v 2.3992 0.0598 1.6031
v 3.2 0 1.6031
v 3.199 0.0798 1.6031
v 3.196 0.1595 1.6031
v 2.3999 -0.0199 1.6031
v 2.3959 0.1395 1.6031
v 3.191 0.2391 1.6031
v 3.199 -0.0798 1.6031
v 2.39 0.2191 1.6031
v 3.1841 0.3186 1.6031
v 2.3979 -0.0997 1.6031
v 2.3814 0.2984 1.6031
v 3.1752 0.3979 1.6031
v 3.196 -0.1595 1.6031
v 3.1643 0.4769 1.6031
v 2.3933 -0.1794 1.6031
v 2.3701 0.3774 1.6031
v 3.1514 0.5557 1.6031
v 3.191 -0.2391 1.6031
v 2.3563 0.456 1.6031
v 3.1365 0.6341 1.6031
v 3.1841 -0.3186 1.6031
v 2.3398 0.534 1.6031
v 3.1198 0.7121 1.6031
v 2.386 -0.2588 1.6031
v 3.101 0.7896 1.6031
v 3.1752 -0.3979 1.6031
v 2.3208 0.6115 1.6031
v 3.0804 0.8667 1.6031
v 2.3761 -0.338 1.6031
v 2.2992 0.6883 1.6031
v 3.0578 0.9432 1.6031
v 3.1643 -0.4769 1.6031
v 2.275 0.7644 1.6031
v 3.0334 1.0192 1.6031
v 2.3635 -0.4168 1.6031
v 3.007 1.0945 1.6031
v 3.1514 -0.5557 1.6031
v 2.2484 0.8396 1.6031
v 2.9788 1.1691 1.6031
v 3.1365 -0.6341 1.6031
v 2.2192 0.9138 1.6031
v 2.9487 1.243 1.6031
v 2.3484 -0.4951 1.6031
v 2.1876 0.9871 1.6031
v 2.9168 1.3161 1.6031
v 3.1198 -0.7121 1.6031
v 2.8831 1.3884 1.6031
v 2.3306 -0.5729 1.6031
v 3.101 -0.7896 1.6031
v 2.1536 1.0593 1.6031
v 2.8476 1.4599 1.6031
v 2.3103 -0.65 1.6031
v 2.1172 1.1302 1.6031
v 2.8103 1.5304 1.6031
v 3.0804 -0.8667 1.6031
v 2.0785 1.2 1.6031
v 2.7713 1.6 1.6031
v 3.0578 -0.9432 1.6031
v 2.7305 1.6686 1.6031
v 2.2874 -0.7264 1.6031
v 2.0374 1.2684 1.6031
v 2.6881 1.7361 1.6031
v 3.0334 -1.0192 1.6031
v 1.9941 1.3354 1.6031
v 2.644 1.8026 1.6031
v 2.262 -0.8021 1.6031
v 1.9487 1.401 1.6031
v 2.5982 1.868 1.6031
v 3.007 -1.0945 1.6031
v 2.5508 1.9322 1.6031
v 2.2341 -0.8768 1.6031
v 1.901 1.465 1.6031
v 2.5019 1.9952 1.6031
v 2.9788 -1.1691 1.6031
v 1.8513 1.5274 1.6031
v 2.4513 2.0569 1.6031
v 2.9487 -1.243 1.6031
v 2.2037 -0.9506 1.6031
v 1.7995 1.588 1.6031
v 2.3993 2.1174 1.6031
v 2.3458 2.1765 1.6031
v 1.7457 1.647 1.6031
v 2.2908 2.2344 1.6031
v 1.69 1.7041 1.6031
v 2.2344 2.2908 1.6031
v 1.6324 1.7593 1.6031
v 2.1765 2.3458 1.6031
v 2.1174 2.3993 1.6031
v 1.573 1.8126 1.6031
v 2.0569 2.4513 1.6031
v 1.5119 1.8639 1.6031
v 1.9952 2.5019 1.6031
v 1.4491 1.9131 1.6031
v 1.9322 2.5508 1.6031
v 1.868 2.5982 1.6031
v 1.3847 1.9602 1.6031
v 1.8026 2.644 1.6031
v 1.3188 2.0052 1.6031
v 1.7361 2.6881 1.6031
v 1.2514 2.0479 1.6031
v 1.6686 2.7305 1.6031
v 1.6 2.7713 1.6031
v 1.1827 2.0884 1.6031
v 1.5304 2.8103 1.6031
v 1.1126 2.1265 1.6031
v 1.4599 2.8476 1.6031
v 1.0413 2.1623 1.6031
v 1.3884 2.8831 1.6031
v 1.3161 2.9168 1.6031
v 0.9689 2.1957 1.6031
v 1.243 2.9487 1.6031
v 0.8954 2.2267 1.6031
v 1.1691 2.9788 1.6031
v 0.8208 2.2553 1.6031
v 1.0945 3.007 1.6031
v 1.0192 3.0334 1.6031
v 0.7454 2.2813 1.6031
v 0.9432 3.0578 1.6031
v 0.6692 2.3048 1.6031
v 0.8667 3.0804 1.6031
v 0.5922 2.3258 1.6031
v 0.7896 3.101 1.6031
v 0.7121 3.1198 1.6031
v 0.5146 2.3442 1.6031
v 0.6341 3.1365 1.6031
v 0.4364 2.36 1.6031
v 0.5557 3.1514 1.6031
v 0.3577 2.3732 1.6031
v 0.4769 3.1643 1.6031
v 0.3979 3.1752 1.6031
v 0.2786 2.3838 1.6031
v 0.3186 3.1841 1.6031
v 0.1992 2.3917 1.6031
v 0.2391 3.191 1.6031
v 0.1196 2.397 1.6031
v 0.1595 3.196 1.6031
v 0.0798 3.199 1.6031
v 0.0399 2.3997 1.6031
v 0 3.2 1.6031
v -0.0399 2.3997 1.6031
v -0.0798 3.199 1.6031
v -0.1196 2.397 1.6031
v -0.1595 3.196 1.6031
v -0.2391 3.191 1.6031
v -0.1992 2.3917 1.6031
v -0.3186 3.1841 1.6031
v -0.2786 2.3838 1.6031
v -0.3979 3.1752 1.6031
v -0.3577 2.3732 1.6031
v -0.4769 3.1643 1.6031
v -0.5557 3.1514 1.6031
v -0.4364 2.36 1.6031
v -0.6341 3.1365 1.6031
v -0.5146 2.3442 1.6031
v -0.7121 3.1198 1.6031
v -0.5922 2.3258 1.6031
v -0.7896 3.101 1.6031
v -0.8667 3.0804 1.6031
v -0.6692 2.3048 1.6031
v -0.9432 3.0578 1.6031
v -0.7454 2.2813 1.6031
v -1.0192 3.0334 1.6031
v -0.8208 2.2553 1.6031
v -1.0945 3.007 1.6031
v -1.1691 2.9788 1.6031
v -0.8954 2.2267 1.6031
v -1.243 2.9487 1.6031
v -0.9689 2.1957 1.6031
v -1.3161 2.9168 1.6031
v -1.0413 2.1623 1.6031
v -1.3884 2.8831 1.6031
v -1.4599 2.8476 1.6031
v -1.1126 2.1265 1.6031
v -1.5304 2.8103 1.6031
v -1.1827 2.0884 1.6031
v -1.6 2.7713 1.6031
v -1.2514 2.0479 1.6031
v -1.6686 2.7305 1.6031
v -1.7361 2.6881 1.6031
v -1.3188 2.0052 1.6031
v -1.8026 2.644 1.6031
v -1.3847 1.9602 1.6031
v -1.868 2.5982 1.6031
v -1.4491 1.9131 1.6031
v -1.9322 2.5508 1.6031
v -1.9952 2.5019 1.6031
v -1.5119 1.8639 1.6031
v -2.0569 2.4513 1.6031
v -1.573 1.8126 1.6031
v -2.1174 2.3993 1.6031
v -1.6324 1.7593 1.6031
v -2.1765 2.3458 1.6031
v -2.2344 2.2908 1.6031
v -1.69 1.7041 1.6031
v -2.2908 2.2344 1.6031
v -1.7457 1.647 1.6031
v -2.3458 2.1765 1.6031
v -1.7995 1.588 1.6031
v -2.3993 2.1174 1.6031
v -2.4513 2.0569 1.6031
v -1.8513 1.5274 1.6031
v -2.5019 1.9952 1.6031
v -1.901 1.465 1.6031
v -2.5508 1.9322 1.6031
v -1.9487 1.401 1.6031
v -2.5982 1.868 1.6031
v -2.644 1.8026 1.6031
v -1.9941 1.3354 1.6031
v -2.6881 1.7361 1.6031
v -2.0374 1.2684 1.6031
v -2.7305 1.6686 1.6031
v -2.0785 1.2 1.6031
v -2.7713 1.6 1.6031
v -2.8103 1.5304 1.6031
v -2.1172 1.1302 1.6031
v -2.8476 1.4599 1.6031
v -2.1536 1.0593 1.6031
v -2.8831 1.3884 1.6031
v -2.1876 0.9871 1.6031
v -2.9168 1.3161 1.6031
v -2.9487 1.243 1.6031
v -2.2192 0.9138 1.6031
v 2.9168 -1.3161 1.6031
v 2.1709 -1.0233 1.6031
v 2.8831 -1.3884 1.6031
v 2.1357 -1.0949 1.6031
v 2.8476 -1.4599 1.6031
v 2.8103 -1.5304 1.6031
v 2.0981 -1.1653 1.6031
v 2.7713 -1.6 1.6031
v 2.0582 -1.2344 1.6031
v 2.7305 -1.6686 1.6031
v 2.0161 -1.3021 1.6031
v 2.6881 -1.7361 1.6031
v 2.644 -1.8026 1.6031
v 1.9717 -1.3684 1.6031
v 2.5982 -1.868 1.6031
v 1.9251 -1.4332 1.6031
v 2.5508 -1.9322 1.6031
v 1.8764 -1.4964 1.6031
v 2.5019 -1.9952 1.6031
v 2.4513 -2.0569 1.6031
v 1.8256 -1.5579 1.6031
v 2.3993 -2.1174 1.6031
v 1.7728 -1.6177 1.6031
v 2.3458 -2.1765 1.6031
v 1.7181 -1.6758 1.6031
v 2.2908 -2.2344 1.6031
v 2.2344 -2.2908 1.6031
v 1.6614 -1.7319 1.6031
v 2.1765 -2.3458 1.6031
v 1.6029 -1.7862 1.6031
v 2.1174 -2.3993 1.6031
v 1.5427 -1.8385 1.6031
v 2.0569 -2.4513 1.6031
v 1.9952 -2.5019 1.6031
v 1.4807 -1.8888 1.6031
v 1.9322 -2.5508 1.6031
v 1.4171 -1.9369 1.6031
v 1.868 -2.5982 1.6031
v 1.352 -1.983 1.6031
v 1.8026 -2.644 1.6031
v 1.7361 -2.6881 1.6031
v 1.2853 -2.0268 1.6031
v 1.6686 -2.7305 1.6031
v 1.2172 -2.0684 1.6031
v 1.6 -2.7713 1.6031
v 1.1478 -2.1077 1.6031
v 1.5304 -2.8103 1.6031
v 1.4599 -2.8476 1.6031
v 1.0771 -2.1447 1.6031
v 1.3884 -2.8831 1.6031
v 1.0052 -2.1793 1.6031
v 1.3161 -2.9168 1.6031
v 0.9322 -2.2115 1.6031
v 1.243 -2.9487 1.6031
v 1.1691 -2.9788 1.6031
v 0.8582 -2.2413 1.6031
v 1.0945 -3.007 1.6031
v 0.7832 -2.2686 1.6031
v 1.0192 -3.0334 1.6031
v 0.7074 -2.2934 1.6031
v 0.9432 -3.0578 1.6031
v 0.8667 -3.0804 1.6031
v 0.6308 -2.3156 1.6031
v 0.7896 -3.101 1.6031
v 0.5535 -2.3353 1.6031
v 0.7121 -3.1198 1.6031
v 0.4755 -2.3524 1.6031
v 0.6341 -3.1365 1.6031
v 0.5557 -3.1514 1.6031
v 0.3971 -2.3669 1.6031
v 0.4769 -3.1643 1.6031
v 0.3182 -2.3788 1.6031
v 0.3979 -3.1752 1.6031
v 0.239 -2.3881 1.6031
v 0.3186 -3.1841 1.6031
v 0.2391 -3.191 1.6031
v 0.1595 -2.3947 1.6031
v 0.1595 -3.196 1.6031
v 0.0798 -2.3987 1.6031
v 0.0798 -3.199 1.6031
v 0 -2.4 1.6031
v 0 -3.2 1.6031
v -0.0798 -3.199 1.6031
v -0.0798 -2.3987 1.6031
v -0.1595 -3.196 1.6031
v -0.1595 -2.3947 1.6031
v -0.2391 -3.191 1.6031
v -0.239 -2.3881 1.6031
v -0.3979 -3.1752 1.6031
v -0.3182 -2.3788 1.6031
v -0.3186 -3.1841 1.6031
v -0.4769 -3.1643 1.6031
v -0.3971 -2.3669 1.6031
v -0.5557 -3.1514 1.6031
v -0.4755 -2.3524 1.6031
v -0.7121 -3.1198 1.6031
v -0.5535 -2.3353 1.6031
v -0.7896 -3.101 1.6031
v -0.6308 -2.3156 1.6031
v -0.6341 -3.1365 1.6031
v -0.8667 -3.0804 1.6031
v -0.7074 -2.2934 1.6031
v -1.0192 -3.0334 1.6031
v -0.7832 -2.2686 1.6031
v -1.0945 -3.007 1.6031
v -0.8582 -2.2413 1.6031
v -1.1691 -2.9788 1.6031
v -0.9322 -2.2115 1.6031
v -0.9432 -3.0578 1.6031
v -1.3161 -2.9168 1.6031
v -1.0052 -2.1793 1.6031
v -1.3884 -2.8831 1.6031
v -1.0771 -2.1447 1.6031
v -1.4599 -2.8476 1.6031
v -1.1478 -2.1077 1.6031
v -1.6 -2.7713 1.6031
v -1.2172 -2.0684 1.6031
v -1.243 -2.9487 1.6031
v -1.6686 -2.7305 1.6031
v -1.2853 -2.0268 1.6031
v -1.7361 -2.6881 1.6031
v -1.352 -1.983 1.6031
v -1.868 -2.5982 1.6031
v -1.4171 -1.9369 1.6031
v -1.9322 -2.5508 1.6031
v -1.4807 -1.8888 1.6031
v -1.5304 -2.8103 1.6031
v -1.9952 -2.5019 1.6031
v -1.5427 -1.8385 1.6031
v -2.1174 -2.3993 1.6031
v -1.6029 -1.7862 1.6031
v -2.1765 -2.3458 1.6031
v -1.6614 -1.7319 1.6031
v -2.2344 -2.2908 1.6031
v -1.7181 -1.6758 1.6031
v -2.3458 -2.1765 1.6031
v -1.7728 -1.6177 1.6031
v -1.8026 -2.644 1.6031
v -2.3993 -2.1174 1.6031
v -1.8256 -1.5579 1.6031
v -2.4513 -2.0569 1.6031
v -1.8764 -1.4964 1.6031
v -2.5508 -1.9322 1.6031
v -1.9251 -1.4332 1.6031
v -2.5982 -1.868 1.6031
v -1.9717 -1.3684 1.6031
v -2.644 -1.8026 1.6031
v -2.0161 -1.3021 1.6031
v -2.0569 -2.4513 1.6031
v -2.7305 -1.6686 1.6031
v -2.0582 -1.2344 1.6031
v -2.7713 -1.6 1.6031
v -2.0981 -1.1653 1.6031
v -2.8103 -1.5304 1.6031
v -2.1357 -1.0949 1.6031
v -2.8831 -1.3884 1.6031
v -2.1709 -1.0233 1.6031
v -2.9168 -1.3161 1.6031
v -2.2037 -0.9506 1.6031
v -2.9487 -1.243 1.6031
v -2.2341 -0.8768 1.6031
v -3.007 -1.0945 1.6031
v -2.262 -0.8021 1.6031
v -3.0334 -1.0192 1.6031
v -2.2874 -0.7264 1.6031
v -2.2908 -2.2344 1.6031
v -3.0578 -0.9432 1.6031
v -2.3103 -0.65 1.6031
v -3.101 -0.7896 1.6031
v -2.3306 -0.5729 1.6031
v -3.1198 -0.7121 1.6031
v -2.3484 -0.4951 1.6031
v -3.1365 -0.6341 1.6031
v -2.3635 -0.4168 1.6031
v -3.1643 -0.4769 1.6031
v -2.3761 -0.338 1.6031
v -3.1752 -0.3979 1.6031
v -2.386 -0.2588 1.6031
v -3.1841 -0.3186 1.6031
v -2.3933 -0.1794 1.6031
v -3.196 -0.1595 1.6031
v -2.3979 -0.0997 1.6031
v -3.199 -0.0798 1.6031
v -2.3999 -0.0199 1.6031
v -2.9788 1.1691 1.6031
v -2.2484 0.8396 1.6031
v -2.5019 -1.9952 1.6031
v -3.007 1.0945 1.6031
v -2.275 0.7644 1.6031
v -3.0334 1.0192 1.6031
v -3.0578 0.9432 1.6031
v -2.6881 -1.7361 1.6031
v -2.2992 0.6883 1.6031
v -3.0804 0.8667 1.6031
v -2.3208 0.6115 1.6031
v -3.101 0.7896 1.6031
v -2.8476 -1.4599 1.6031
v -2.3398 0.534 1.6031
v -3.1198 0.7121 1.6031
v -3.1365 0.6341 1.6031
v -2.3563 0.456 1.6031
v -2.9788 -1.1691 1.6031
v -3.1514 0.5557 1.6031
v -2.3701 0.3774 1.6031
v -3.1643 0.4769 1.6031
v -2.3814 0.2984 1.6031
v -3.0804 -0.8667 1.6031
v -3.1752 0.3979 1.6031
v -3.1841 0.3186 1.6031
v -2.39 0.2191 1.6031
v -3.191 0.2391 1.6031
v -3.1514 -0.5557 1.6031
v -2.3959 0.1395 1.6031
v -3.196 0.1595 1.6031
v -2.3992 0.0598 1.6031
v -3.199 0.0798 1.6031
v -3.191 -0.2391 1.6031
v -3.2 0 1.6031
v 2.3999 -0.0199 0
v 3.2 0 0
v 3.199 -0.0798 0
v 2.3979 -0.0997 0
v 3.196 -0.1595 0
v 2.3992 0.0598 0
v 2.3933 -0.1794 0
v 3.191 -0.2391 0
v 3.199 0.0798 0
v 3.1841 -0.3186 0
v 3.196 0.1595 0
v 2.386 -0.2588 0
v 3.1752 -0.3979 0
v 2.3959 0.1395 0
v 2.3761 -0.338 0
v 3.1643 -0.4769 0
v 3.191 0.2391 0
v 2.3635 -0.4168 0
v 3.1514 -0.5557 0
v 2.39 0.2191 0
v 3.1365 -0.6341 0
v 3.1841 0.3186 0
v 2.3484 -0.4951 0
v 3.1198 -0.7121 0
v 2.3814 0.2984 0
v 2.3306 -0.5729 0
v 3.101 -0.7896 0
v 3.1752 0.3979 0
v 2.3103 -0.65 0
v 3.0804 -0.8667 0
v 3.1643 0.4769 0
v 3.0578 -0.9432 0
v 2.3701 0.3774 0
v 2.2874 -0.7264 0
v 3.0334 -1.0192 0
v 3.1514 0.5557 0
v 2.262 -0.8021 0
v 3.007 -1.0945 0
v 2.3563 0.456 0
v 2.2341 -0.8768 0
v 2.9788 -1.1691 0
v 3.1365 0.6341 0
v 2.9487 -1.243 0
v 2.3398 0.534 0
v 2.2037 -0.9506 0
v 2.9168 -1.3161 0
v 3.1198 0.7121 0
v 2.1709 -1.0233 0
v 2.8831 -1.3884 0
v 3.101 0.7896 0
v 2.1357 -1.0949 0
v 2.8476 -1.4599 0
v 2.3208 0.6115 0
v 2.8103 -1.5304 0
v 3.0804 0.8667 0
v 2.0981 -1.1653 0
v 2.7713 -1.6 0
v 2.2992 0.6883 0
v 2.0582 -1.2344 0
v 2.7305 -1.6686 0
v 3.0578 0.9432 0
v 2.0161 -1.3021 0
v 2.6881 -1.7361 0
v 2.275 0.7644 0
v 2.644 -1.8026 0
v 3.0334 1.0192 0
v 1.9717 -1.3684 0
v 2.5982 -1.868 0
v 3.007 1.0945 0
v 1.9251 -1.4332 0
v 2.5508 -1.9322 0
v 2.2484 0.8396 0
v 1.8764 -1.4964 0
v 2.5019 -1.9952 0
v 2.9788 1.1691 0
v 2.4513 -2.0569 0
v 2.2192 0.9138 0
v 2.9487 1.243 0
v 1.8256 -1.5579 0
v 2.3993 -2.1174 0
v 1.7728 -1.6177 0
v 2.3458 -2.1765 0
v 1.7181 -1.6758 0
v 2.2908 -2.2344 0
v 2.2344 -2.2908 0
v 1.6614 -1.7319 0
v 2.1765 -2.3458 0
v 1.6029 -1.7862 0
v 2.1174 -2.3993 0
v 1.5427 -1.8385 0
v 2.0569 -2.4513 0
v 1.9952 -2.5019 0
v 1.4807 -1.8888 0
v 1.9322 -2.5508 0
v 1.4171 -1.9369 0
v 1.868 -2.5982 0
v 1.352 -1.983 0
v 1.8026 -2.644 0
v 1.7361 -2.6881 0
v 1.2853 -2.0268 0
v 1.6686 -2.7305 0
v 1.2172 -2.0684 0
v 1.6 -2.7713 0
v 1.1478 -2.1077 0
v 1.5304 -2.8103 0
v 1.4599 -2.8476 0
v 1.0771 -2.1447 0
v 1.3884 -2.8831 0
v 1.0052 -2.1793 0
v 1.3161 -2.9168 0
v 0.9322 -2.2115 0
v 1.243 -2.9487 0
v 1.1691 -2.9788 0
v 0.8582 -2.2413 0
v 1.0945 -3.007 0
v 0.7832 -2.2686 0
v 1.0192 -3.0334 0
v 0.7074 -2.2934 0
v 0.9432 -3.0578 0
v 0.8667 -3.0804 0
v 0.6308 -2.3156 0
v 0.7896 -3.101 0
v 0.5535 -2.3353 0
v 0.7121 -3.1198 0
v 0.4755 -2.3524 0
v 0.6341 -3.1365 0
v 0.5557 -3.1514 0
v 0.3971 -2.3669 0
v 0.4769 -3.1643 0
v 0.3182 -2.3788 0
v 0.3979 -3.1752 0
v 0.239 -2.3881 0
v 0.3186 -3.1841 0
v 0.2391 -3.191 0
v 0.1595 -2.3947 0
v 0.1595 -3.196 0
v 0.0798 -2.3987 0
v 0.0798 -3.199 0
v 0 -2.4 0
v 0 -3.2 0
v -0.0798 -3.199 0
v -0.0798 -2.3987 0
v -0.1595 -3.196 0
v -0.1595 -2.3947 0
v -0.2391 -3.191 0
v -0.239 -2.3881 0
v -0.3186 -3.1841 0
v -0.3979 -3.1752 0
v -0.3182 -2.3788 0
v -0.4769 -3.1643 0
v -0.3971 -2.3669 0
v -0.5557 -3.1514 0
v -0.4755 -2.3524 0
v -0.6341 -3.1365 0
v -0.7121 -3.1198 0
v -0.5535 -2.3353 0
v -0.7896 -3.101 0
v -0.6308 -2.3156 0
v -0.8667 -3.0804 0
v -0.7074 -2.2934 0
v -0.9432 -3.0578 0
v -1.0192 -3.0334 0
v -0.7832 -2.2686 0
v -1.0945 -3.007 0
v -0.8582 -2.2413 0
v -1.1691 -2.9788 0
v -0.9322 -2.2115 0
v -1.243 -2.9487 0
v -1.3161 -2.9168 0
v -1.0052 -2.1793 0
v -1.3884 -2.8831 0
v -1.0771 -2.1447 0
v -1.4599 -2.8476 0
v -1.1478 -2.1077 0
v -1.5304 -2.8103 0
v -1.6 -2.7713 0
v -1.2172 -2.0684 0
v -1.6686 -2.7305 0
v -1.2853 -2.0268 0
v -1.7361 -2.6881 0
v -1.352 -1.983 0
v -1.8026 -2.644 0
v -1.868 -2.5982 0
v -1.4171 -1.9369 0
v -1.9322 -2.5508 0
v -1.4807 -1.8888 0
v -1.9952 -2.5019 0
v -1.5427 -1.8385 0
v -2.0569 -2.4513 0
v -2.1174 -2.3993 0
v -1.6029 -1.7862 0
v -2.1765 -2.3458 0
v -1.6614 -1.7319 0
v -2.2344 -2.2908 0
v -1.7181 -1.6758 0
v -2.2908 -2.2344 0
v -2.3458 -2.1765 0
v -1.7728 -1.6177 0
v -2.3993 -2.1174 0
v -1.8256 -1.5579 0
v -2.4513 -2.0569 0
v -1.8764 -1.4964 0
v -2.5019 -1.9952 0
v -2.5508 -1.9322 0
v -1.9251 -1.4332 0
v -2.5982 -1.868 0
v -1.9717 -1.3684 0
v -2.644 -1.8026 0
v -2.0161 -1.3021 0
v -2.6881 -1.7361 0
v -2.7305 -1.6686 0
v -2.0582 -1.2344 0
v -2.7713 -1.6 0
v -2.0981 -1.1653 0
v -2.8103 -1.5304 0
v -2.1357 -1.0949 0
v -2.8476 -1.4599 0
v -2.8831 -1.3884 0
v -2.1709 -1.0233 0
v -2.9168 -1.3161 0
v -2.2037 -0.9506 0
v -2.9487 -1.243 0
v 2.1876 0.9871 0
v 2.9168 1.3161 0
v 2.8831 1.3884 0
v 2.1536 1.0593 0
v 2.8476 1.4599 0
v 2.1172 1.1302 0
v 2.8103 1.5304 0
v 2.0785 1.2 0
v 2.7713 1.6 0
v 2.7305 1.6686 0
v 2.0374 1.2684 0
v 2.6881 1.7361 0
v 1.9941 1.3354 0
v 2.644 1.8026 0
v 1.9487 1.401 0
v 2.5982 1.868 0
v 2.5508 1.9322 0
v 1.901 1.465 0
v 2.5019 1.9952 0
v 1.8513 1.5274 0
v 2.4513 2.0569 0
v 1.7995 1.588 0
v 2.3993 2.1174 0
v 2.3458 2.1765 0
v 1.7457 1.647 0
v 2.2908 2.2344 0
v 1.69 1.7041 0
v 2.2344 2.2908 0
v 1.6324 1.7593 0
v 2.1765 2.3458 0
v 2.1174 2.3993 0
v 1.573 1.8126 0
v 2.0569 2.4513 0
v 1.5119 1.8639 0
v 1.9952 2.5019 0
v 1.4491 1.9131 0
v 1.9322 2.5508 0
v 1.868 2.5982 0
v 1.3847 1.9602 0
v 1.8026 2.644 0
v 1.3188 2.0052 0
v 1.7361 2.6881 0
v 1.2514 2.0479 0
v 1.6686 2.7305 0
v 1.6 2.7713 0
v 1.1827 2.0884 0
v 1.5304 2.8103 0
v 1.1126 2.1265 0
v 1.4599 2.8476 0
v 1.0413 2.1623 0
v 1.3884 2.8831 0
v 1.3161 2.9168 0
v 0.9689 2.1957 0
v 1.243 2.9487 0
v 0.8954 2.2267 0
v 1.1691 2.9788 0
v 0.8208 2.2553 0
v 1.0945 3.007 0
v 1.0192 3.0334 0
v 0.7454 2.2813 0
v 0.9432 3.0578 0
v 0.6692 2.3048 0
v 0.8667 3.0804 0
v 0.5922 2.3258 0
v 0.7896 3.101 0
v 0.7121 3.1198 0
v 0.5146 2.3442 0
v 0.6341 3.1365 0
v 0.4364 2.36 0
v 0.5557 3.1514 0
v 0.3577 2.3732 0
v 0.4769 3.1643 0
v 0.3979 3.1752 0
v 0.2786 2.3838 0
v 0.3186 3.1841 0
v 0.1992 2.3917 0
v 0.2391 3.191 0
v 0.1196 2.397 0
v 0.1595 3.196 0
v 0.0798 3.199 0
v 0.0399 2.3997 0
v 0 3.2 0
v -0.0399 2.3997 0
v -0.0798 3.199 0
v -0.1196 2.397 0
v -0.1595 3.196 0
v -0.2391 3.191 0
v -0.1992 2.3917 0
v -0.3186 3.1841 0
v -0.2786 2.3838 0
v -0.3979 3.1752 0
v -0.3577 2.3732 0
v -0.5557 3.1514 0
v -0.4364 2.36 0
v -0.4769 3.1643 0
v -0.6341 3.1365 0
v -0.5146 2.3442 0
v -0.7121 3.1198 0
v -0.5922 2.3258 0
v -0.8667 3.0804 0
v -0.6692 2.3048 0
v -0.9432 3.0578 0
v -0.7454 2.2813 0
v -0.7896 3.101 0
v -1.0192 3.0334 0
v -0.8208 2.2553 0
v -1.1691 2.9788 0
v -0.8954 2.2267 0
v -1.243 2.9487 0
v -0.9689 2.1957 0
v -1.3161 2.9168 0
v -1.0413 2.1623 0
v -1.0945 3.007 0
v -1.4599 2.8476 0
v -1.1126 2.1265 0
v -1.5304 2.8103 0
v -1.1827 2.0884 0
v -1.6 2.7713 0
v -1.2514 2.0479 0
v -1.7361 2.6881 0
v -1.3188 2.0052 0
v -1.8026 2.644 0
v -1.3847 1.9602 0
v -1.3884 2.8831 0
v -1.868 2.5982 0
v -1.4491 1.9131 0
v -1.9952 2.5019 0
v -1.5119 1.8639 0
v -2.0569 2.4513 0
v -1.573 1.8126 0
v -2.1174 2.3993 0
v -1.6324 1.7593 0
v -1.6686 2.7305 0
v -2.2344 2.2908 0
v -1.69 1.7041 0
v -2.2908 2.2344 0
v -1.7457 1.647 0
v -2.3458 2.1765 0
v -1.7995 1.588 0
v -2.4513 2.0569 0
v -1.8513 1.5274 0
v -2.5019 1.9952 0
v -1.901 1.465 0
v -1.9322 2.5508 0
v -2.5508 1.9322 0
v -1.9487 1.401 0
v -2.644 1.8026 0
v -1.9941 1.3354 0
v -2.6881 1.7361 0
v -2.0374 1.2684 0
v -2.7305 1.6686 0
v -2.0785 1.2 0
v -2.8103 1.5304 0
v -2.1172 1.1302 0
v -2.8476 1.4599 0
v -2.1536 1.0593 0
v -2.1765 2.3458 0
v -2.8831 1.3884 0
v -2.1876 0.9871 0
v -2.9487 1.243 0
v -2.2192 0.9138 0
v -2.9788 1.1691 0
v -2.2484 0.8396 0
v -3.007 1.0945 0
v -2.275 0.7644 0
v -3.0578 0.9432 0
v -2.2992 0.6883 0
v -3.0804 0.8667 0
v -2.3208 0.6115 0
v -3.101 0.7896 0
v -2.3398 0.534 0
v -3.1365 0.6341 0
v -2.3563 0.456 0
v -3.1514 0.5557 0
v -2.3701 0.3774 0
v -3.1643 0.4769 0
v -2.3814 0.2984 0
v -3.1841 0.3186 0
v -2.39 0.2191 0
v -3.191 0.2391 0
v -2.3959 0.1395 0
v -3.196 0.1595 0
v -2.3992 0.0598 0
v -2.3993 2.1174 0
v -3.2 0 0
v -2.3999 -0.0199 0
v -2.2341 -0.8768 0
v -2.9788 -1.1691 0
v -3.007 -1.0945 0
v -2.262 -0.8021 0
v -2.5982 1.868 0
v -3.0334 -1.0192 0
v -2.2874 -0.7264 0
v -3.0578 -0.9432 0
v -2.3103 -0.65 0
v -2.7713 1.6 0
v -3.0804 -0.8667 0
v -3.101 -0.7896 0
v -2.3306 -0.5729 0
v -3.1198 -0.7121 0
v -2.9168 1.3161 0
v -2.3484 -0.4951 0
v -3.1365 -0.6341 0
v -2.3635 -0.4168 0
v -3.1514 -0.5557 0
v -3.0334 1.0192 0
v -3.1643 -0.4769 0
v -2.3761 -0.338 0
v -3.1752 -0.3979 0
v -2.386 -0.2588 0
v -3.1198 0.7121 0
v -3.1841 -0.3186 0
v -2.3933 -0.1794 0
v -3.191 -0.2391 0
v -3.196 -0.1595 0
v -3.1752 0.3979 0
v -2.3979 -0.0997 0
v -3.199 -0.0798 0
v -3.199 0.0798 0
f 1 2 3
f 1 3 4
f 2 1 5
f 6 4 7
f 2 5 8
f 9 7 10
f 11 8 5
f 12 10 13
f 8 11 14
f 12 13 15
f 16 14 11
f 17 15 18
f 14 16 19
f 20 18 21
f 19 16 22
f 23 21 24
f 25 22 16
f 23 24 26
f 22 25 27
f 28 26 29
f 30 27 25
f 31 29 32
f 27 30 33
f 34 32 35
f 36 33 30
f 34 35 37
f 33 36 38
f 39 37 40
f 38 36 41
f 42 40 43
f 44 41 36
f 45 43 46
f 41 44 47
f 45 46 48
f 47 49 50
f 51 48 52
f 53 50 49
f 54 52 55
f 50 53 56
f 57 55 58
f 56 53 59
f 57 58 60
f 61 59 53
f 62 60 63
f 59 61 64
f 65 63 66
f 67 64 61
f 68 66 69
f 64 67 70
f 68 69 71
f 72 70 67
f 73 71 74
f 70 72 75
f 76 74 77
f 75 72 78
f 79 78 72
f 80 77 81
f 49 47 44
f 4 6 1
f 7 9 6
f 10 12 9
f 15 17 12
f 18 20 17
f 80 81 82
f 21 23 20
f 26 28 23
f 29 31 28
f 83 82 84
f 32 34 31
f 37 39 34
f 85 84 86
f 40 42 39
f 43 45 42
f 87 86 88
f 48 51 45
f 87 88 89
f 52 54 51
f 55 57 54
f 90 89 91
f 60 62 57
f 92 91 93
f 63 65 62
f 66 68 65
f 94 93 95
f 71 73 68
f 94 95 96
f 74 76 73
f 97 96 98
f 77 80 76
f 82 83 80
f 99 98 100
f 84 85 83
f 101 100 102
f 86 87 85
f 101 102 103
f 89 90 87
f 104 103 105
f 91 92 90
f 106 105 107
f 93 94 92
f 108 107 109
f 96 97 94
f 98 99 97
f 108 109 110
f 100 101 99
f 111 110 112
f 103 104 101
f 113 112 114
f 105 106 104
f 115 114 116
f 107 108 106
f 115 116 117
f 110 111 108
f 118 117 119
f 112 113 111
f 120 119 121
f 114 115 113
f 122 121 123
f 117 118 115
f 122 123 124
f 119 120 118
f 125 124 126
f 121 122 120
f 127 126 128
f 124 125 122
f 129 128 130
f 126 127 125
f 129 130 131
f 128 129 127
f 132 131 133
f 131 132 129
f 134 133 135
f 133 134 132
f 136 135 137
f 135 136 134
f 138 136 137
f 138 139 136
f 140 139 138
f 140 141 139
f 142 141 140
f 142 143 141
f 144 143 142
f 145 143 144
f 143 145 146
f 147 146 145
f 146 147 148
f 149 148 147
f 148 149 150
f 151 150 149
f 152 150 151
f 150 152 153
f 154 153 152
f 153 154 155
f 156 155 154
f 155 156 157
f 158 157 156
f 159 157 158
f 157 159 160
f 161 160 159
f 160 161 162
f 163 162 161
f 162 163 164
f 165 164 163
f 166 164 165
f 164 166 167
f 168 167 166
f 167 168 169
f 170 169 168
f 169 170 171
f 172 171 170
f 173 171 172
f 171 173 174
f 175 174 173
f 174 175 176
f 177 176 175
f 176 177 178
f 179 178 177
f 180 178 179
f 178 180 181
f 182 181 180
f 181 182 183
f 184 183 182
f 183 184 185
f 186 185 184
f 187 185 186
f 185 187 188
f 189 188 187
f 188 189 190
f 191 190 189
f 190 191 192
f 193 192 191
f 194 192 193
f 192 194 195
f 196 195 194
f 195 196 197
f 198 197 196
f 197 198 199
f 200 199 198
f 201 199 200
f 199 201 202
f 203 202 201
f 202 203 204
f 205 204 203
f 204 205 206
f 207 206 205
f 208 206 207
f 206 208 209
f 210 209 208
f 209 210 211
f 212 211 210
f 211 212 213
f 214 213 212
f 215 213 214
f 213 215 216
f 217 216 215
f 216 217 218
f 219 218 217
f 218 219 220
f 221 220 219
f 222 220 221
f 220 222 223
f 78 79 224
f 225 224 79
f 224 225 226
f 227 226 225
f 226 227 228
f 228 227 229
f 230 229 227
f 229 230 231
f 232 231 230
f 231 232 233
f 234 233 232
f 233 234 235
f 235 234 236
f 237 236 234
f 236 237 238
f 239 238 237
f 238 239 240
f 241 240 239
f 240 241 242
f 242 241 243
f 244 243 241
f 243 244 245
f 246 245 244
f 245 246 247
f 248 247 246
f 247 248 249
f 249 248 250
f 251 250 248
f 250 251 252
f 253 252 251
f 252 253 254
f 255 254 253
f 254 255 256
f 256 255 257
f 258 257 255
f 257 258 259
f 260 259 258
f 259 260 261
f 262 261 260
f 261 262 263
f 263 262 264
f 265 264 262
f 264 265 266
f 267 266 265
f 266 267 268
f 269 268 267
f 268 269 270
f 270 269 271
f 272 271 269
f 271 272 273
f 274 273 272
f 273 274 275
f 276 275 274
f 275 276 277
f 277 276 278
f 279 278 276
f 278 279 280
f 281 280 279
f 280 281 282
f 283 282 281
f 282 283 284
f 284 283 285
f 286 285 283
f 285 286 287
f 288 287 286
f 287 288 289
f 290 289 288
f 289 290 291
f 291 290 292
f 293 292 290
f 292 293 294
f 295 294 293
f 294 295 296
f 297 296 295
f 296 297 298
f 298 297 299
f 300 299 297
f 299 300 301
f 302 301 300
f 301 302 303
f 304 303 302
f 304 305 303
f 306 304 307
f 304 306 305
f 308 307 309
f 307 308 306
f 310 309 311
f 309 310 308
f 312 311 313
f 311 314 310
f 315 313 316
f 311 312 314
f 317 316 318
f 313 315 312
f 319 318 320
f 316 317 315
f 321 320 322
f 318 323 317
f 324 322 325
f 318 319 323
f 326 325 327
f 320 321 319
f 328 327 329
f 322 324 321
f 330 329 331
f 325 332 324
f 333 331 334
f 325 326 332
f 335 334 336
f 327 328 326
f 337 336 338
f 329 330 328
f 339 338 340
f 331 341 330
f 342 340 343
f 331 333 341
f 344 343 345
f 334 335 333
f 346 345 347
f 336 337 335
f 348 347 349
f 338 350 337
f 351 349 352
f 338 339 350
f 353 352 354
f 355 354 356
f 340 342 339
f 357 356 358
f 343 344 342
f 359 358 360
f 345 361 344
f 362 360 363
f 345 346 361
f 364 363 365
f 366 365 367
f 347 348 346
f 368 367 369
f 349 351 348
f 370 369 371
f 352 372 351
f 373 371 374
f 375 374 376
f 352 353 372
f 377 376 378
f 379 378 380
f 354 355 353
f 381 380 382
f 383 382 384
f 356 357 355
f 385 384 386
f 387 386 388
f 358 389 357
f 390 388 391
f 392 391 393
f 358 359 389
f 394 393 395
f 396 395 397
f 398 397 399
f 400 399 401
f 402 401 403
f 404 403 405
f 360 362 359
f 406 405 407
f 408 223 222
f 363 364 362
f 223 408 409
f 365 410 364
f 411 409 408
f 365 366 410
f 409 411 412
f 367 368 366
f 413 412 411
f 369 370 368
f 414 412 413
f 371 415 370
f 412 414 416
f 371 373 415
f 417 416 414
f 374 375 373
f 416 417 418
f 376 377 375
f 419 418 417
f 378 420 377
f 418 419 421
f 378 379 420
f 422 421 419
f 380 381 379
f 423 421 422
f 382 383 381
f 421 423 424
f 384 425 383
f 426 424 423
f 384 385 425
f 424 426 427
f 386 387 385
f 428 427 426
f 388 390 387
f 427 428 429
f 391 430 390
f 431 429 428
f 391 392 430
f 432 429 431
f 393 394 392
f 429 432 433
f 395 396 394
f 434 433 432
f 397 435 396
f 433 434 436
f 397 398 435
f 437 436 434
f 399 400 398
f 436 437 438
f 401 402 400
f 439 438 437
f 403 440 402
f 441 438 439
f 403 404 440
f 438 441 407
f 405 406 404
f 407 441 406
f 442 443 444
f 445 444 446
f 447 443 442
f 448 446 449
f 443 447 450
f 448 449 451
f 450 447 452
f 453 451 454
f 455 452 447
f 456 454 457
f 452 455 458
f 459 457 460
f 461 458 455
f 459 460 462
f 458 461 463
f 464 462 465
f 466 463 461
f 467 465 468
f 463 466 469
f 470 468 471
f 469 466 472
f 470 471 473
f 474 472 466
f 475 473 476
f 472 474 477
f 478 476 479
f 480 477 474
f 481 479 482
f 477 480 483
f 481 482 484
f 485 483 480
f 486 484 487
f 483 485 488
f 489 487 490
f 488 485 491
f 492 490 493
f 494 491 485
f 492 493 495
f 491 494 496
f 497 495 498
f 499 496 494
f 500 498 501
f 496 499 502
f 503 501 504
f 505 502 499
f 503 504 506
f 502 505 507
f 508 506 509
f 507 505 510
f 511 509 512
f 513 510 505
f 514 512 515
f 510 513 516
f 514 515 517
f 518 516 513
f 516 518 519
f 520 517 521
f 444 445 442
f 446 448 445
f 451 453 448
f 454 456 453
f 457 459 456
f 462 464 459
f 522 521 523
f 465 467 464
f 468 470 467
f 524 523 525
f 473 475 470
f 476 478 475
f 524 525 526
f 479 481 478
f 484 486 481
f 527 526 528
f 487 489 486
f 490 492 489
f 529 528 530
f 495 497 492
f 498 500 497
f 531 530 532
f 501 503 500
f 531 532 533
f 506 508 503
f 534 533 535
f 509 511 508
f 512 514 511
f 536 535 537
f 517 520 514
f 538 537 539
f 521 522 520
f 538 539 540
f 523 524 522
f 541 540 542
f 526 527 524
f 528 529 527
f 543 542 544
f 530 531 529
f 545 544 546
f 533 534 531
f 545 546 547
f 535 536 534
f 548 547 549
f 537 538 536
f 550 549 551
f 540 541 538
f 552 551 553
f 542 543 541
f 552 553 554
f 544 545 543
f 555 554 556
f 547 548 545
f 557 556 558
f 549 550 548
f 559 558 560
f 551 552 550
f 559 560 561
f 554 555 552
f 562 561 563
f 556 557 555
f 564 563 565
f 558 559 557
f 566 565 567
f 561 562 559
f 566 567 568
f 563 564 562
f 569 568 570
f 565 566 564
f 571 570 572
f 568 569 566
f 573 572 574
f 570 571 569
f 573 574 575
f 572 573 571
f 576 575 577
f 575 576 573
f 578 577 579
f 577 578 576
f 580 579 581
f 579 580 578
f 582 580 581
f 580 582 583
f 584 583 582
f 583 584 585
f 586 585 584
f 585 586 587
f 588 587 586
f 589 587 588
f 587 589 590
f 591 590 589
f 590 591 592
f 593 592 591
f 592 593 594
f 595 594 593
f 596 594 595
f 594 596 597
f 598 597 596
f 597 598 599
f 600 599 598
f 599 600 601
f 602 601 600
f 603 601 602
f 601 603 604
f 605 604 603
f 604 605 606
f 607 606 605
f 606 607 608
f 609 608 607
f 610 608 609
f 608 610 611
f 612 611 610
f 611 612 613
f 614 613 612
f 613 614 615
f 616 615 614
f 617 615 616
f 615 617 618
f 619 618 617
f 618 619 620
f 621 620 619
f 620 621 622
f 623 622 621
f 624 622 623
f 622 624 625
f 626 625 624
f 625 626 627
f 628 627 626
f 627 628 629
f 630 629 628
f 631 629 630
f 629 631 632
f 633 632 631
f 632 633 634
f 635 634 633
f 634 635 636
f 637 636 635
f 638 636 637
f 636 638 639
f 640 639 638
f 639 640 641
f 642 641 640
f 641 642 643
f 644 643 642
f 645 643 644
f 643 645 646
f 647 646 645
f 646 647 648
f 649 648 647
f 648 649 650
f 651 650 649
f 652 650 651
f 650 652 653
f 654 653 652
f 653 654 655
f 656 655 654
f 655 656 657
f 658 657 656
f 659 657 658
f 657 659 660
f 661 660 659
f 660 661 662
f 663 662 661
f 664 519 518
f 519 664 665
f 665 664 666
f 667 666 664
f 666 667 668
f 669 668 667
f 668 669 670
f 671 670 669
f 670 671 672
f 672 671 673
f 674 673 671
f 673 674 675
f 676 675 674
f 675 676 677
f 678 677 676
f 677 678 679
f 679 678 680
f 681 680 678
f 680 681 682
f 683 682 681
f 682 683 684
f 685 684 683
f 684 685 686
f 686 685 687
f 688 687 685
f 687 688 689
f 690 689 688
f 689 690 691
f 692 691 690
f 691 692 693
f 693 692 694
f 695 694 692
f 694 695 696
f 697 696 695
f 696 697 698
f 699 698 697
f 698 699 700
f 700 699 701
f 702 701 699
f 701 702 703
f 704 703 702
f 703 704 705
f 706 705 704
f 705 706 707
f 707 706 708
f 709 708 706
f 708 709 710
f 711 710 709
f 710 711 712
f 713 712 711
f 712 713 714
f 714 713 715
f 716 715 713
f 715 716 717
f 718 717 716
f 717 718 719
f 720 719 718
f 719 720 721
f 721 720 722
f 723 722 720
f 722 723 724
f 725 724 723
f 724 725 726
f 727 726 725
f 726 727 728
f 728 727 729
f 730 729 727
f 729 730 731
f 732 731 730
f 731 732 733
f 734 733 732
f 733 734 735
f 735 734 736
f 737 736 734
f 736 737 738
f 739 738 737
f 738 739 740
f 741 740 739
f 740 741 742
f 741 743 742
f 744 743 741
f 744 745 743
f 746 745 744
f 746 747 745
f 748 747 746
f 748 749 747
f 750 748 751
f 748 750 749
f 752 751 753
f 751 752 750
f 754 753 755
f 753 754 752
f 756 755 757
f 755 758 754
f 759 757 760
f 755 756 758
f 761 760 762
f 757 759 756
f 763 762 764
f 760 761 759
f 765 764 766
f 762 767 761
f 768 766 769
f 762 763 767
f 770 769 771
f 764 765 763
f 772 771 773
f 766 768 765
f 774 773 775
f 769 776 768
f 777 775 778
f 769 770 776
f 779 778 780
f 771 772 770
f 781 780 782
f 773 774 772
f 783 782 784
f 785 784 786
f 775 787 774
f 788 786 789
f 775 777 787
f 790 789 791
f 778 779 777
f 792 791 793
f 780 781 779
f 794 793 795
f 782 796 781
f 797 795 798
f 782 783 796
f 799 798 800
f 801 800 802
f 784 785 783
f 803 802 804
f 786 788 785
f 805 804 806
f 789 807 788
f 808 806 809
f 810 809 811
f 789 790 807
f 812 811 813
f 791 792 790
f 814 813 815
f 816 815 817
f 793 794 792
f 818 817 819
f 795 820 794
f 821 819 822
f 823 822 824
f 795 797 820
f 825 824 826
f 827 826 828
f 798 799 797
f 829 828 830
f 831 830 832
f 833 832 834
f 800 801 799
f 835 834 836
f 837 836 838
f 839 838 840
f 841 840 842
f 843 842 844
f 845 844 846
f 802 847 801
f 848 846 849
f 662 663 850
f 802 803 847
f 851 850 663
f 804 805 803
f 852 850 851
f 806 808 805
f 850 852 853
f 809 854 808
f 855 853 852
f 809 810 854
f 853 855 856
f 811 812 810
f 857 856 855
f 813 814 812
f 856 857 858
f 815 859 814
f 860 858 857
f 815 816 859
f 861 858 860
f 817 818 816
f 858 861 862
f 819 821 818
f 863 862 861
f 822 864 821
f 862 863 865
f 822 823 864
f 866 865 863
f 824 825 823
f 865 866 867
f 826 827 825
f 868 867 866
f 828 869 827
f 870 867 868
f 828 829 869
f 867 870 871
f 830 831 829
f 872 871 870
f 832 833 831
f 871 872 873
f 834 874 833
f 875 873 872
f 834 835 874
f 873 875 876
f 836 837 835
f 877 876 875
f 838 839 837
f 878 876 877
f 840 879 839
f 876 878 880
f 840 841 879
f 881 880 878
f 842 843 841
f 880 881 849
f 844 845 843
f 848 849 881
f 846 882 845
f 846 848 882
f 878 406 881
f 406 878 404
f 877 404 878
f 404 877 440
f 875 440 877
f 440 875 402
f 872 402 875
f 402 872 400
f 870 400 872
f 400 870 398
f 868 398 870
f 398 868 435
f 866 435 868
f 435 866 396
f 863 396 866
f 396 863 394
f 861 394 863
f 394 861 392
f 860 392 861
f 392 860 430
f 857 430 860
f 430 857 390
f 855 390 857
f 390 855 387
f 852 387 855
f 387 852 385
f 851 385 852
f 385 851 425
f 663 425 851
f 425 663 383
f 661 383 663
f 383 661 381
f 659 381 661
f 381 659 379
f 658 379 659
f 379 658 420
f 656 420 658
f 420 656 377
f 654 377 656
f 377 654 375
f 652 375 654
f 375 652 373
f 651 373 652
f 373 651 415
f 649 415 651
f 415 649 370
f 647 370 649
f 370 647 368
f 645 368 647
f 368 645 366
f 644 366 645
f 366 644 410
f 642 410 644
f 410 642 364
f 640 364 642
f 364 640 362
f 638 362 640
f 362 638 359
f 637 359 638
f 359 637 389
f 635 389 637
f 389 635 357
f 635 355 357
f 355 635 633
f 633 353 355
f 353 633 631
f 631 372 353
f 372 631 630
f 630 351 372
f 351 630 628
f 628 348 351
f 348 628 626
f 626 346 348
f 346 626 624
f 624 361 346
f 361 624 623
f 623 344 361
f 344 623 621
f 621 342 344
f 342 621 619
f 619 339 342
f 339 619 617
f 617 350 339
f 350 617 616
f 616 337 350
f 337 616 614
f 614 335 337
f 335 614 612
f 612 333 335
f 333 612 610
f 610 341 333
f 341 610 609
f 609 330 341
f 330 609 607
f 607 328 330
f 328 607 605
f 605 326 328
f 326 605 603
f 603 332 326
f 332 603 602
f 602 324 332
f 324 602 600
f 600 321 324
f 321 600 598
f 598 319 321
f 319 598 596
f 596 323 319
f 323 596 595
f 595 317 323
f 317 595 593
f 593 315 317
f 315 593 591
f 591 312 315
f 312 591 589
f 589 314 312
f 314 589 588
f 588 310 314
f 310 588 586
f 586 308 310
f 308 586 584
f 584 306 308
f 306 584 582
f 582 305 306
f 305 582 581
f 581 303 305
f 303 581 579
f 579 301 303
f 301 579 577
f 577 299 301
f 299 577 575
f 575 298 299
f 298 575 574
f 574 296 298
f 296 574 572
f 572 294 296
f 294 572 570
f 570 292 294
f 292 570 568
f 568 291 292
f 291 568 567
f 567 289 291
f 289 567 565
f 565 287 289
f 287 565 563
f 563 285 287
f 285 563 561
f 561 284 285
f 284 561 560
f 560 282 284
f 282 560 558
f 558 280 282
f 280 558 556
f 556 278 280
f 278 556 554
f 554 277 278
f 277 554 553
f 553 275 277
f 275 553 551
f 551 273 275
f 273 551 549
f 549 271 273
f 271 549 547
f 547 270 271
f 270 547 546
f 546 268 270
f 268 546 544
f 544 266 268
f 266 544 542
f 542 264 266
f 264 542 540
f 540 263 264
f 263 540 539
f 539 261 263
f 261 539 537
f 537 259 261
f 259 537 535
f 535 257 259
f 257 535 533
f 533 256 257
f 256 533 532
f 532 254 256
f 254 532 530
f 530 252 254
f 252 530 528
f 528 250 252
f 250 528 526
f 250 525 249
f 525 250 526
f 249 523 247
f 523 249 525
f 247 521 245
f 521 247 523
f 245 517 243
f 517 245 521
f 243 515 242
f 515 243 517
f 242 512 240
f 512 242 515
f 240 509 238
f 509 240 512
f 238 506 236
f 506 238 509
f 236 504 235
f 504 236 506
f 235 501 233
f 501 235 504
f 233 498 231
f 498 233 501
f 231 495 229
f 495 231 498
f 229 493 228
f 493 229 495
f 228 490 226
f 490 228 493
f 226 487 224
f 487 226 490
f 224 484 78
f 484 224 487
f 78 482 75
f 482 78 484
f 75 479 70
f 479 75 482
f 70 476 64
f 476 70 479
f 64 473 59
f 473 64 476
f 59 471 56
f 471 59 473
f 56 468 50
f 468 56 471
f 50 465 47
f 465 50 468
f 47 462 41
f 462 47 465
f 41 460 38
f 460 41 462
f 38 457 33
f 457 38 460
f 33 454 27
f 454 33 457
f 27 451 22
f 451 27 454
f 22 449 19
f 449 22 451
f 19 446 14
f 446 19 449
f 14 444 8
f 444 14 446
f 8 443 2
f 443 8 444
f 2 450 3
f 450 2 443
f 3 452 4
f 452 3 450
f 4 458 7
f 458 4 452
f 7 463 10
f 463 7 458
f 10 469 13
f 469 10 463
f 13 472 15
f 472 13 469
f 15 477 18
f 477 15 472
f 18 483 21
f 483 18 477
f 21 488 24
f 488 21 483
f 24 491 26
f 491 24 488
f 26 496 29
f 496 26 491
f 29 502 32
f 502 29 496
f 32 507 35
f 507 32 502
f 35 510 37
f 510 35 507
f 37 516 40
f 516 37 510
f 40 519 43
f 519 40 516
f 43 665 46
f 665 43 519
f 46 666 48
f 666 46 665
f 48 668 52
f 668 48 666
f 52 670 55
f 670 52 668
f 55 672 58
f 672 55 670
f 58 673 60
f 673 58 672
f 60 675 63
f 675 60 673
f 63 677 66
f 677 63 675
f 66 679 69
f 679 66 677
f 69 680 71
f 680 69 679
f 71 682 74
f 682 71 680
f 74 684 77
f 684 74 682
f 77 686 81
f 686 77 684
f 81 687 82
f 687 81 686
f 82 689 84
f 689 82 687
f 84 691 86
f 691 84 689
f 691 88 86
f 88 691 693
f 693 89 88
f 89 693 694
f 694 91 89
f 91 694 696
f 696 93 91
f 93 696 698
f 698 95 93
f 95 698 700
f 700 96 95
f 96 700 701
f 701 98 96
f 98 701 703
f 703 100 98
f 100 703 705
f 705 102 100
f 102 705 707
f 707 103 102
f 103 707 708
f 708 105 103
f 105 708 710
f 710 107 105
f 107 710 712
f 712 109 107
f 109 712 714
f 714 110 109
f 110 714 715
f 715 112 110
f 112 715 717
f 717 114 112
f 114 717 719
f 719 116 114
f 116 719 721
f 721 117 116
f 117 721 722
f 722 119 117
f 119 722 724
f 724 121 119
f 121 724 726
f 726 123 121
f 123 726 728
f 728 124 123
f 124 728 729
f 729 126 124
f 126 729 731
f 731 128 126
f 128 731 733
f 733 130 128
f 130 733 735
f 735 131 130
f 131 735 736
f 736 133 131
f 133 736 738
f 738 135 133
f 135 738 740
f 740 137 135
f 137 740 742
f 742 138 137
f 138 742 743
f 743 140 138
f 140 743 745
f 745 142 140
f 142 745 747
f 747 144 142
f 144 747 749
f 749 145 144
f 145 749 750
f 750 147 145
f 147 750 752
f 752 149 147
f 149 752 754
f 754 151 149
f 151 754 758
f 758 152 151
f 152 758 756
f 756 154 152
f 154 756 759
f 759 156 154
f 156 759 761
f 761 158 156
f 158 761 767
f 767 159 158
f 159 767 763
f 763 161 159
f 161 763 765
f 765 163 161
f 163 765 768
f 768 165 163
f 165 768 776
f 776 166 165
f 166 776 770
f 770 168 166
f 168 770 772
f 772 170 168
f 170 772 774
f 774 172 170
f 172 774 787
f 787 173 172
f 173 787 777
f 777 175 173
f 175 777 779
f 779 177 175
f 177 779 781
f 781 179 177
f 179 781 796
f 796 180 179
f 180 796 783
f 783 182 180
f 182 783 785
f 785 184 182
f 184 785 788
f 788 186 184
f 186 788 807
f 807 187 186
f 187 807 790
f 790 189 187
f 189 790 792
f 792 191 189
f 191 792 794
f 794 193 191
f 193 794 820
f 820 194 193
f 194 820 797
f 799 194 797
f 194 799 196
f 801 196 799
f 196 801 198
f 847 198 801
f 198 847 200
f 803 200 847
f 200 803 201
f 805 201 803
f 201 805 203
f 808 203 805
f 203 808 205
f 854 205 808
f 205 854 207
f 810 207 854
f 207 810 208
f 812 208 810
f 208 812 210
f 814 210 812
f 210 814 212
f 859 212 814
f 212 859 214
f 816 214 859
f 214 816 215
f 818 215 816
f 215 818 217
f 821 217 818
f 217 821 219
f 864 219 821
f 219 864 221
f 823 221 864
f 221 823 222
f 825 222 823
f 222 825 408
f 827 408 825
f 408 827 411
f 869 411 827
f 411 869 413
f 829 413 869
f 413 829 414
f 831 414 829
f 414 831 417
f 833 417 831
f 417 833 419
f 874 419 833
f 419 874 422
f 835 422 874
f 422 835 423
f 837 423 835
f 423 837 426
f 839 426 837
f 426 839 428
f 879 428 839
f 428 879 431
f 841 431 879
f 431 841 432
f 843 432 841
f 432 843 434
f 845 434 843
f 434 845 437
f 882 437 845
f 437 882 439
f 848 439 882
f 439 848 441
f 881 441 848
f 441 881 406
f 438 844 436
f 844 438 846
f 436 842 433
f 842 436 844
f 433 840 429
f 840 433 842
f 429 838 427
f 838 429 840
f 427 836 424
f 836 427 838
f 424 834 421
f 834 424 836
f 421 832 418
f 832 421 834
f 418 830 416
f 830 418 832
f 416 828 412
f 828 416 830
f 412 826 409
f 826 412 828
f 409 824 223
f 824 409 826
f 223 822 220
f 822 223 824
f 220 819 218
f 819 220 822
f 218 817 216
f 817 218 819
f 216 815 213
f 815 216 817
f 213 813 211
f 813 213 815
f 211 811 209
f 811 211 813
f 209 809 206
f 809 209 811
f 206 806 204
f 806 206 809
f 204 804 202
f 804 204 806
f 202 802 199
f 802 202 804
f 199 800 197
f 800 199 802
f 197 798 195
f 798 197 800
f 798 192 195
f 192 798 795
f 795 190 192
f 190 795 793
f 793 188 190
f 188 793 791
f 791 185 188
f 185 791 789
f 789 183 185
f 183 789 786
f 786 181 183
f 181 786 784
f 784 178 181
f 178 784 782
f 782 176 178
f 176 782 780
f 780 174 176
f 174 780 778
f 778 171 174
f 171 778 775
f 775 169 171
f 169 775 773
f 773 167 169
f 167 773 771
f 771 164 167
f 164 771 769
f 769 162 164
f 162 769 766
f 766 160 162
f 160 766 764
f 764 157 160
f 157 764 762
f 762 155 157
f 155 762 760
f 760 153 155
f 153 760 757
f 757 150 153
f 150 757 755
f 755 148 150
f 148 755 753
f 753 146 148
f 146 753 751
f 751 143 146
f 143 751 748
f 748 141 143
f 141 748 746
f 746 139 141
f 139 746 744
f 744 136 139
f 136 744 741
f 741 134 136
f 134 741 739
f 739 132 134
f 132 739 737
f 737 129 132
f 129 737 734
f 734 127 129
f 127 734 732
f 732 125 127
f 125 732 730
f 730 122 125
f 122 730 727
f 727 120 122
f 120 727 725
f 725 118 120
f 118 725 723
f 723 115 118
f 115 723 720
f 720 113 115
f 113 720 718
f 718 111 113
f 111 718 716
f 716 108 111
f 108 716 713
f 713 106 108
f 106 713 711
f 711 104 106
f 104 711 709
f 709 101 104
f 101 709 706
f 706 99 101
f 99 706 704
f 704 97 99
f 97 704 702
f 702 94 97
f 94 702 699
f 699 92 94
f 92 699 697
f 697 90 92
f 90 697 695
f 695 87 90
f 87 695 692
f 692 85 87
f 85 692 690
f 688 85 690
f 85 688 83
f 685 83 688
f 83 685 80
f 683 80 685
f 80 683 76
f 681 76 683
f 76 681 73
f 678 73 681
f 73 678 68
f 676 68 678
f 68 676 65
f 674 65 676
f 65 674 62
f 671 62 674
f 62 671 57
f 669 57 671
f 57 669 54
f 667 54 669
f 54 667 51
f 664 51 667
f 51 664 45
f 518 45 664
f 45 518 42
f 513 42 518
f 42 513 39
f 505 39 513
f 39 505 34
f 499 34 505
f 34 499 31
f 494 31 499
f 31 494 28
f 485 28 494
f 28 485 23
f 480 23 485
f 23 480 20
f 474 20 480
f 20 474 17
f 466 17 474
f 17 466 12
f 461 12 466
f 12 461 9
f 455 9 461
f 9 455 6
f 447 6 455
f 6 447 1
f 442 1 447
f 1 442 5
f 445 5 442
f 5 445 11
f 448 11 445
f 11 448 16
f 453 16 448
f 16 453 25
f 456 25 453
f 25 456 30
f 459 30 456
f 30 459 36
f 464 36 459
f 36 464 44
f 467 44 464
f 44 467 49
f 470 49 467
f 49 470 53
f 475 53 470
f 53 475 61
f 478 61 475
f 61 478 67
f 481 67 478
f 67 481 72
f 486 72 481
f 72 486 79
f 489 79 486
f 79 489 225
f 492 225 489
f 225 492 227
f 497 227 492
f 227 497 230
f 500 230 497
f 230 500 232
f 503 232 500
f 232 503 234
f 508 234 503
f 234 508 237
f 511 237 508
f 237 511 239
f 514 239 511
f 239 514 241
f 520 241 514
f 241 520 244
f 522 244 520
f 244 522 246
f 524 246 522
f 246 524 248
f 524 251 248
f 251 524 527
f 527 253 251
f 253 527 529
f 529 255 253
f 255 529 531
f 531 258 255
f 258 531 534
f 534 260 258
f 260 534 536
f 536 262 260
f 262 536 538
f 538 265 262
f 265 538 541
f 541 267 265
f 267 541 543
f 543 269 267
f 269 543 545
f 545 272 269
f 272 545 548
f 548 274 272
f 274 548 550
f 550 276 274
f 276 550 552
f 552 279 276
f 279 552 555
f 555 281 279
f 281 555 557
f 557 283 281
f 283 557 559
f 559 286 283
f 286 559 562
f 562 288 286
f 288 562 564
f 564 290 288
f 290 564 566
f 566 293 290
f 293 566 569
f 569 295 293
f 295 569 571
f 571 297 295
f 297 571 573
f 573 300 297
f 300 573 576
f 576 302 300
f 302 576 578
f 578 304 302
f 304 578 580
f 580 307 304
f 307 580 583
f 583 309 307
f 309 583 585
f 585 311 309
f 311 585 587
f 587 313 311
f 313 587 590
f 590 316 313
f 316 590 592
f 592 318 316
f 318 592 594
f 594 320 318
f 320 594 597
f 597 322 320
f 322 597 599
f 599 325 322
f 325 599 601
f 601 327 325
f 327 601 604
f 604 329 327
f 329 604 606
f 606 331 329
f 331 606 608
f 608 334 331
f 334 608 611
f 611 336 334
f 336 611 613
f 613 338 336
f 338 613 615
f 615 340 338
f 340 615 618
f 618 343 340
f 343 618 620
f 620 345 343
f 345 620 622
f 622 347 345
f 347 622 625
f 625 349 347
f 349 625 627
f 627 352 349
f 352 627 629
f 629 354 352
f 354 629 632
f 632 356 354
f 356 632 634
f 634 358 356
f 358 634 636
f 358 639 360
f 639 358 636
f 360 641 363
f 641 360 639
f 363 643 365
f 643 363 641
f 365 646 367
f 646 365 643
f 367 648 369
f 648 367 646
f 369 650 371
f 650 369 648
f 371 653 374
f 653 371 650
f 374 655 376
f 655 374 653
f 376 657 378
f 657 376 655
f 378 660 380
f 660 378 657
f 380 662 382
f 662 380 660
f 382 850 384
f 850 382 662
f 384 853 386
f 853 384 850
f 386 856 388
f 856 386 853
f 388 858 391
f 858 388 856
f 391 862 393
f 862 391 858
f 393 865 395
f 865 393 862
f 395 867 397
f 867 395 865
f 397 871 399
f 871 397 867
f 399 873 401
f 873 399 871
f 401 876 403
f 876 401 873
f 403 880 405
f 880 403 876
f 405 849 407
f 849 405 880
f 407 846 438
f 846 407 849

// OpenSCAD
use <../lib.scad>
use <../p/4-4disc.scad>
use <s/55704s01.scad>
use <../p/stud4.scad>
$fa=1; $fs=0.2;
function ldraw_lib__55704(realsolid=false) = [
// 0 Minifig Headdress Batman
// 0 Name: 55704.dat
// 0 Author: Magnus Forsberg [MagFors]
// 0 !LDRAW_ORG Part UPDATE 2012-03
// 0 !LICENSE Licensed under CC BY 2.0 and CC BY 4.0 : see CAreadme.txt
// 
// 0 BFC CERTIFY CCW
  [0,"BFC","CERTIFY"],
  [0,"BFC","CCW"],
// 
// 0 !CATEGORY Minifig Headwear
// 
// 0 !HISTORY 2012-02-12 {LEGO Digital Designer} Original part shape
// 0 !HISTORY 2012-02-12 [MagFors] File preparation for LDraw Parts Tracker
// 0 !HISTORY 2012-03-30 [PTadmin] Official Update 2012-01
// 0 !HISTORY 2012-12-24 [cwdee] Update category
// 0 !HISTORY 2012-12-28 [PTadmin] Official Update 2012-03
// 
// 
// 1 16 0 0 0 1 0 0 0 1 0 0 0 1 s\55704s01.dat
  [1,16,0,0,0,1,0,0,0,1,0,0,0,1, ldraw_lib__s__55704s01(realsolid)],
// 1 16 0 0 0 -1 0 0 0 1 0 0 0 1 s\55704s01.dat
  [1,16,0,0,0,-1,0,0,0,1,0,0,0,1, ldraw_lib__s__55704s01(realsolid)],
// 1 16 0 -4 0 6 0 0 0 -1 0 0 0 -6 4-4disc.dat
  [1,16,0,-4,0,6,0,0,0,-1,0,0,0,-6, ldraw_lib__4_4disc(realsolid)],
// 1 16 0 -4 0 1 0 0 0 -1 0 0 0 1 stud4.dat
  [1,16,0,-4,0,1,0,0,0,-1,0,0,0,1, ldraw_lib__stud4(realsolid)],
// 5 24 0 19.5 -17.4 0 23.25 -16.75 4.19 19.5 -16.93 -4.19 19.5 -16.93
  [5,24,0,19.5,-17.4,0,23.25,-16.75,4.19,19.5,-16.93,-4.19,19.5,-16.93],
// 5 24 0 23.25 -12.81 0 19.5 -13 6.51 23.25 -11.26 -6.51 23.25 -11.26
  [5,24,0,23.25,-12.81,0,19.5,-13,6.51,23.25,-11.26,-6.51,23.25,-11.26],
// 5 24 0 0.47 16.73 0 -3.44 15.69 3.99 -3.97 15.38 -3.99 -3.97 15.38
  [5,24,0,0.47,16.73,0,-3.44,15.69,3.99,-3.97,15.38,-3.99,-3.97,15.38],
// 5 24 0 19.24 16.75 0 0.47 16.73 4.37 19.39 16.17 -4.37 19.39 16.17
  [5,24,0,19.24,16.75,0,0.47,16.73,4.37,19.39,16.17,-4.37,19.39,16.17],
// 5 24 0 13.53 -13 0 0 -13 2.37 6.31 -12.79 -2.37 6.31 -12.79
  [5,24,0,13.53,-13,0,0,-13,2.37,6.31,-12.79,-2.37,6.31,-12.79],
// 5 24 0 1.79 -17.82 0 4.5 -18.15 3.83 3.45 -17.72 -3.83 3.45 -17.72
  [5,24,0,1.79,-17.82,0,4.5,-18.15,3.83,3.45,-17.72,-3.83,3.45,-17.72],
// 5 24 0 -9.91 -8.29 0 -5.92 -13.86 2.83 -9.37 -8.82 -2.83 -9.37 -8.82
  [5,24,0,-9.91,-8.29,0,-5.92,-13.86,2.83,-9.37,-8.82,-2.83,-9.37,-8.82],
// 5 24 0 -8.58 9.69 0 -9.82 7.4 4.04 -8.41 9.87 -4.04 -8.41 9.87
  [5,24,0,-8.58,9.69,0,-9.82,7.4,4.04,-8.41,9.87,-4.04,-8.41,9.87],
// 5 24 0 -9.82 7.4 0 -11.06 3.66 3.84 -9.95 6.77 -3.84 -9.95 6.77
  [5,24,0,-9.82,7.4,0,-11.06,3.66,3.84,-9.95,6.77,-3.84,-9.95,6.77],
// 5 24 0 4.5 -18.15 0 13.53 -21.28 1.37 5.92 -18.16 -1.37 5.92 -18.16
  [5,24,0,4.5,-18.15,0,13.53,-21.28,1.37,5.92,-18.16,-1.37,5.92,-18.16],
// 5 24 0 0.5 -16.75 0 1.79 -17.82 3.54 -0.26 -16.37 -3.54 -0.26 -16.37
  [5,24,0,0.5,-16.75,0,1.79,-17.82,3.54,-0.26,-16.37,-3.54,-0.26,-16.37],
// 5 24 0 -5.92 -13.86 0 0.5 -16.75 3.23 -5.59 -13.55 -3.23 -5.59 -13.55
  [5,24,0,-5.92,-13.86,0,0.5,-16.75,3.23,-5.59,-13.55,-3.23,-5.59,-13.55],
// 5 24 0 0 13 0 20.24 12.99 4.98 0 12.01 -4.98 0 12.01
  [5,24,0,0,13,0,20.24,12.99,4.98,0,12.01,-4.98,0,12.01],
// 5 24 0 13.53 -21.28 0 13.53 -13 3.47 12.94 -17.77 -3.47 12.94 -17.77
  [5,24,0,13.53,-21.28,0,13.53,-13,3.47,12.94,-17.77,-3.47,12.94,-17.77],
// 5 24 0 -11.33 -3.09 0 -9.91 -8.29 2.44 -11.25 -3.06 -2.44 -11.25 -3.06
  [5,24,0,-11.33,-3.09,0,-9.91,-8.29,2.44,-11.25,-3.06,-2.44,-11.25,-3.06],
// 5 24 0 -11.06 3.66 0 -11.33 -3.09 3.66 -10.98 3.45 -3.66 -10.98 3.45
  [5,24,0,-11.06,3.66,0,-11.33,-3.09,3.66,-10.98,3.45,-3.66,-10.98,3.45],
// 5 24 0 -3.44 15.69 0 -8.58 9.69 3.99 -3.97 15.38 -3.99 -3.97 15.38
  [5,24,0,-3.44,15.69,0,-8.58,9.69,3.99,-3.97,15.38,-3.99,-3.97,15.38],
];
module ldraw_lib__55704(step=0, col=false, unit=2/5, alt=false, line=0.2, solid=!$preview)
    makepoly(ldraw_lib__55704(solid), step=step, col=col, unit=unit, alt=alt, line=line, solid=solid);
ldraw_lib__55704(line=0.2);
